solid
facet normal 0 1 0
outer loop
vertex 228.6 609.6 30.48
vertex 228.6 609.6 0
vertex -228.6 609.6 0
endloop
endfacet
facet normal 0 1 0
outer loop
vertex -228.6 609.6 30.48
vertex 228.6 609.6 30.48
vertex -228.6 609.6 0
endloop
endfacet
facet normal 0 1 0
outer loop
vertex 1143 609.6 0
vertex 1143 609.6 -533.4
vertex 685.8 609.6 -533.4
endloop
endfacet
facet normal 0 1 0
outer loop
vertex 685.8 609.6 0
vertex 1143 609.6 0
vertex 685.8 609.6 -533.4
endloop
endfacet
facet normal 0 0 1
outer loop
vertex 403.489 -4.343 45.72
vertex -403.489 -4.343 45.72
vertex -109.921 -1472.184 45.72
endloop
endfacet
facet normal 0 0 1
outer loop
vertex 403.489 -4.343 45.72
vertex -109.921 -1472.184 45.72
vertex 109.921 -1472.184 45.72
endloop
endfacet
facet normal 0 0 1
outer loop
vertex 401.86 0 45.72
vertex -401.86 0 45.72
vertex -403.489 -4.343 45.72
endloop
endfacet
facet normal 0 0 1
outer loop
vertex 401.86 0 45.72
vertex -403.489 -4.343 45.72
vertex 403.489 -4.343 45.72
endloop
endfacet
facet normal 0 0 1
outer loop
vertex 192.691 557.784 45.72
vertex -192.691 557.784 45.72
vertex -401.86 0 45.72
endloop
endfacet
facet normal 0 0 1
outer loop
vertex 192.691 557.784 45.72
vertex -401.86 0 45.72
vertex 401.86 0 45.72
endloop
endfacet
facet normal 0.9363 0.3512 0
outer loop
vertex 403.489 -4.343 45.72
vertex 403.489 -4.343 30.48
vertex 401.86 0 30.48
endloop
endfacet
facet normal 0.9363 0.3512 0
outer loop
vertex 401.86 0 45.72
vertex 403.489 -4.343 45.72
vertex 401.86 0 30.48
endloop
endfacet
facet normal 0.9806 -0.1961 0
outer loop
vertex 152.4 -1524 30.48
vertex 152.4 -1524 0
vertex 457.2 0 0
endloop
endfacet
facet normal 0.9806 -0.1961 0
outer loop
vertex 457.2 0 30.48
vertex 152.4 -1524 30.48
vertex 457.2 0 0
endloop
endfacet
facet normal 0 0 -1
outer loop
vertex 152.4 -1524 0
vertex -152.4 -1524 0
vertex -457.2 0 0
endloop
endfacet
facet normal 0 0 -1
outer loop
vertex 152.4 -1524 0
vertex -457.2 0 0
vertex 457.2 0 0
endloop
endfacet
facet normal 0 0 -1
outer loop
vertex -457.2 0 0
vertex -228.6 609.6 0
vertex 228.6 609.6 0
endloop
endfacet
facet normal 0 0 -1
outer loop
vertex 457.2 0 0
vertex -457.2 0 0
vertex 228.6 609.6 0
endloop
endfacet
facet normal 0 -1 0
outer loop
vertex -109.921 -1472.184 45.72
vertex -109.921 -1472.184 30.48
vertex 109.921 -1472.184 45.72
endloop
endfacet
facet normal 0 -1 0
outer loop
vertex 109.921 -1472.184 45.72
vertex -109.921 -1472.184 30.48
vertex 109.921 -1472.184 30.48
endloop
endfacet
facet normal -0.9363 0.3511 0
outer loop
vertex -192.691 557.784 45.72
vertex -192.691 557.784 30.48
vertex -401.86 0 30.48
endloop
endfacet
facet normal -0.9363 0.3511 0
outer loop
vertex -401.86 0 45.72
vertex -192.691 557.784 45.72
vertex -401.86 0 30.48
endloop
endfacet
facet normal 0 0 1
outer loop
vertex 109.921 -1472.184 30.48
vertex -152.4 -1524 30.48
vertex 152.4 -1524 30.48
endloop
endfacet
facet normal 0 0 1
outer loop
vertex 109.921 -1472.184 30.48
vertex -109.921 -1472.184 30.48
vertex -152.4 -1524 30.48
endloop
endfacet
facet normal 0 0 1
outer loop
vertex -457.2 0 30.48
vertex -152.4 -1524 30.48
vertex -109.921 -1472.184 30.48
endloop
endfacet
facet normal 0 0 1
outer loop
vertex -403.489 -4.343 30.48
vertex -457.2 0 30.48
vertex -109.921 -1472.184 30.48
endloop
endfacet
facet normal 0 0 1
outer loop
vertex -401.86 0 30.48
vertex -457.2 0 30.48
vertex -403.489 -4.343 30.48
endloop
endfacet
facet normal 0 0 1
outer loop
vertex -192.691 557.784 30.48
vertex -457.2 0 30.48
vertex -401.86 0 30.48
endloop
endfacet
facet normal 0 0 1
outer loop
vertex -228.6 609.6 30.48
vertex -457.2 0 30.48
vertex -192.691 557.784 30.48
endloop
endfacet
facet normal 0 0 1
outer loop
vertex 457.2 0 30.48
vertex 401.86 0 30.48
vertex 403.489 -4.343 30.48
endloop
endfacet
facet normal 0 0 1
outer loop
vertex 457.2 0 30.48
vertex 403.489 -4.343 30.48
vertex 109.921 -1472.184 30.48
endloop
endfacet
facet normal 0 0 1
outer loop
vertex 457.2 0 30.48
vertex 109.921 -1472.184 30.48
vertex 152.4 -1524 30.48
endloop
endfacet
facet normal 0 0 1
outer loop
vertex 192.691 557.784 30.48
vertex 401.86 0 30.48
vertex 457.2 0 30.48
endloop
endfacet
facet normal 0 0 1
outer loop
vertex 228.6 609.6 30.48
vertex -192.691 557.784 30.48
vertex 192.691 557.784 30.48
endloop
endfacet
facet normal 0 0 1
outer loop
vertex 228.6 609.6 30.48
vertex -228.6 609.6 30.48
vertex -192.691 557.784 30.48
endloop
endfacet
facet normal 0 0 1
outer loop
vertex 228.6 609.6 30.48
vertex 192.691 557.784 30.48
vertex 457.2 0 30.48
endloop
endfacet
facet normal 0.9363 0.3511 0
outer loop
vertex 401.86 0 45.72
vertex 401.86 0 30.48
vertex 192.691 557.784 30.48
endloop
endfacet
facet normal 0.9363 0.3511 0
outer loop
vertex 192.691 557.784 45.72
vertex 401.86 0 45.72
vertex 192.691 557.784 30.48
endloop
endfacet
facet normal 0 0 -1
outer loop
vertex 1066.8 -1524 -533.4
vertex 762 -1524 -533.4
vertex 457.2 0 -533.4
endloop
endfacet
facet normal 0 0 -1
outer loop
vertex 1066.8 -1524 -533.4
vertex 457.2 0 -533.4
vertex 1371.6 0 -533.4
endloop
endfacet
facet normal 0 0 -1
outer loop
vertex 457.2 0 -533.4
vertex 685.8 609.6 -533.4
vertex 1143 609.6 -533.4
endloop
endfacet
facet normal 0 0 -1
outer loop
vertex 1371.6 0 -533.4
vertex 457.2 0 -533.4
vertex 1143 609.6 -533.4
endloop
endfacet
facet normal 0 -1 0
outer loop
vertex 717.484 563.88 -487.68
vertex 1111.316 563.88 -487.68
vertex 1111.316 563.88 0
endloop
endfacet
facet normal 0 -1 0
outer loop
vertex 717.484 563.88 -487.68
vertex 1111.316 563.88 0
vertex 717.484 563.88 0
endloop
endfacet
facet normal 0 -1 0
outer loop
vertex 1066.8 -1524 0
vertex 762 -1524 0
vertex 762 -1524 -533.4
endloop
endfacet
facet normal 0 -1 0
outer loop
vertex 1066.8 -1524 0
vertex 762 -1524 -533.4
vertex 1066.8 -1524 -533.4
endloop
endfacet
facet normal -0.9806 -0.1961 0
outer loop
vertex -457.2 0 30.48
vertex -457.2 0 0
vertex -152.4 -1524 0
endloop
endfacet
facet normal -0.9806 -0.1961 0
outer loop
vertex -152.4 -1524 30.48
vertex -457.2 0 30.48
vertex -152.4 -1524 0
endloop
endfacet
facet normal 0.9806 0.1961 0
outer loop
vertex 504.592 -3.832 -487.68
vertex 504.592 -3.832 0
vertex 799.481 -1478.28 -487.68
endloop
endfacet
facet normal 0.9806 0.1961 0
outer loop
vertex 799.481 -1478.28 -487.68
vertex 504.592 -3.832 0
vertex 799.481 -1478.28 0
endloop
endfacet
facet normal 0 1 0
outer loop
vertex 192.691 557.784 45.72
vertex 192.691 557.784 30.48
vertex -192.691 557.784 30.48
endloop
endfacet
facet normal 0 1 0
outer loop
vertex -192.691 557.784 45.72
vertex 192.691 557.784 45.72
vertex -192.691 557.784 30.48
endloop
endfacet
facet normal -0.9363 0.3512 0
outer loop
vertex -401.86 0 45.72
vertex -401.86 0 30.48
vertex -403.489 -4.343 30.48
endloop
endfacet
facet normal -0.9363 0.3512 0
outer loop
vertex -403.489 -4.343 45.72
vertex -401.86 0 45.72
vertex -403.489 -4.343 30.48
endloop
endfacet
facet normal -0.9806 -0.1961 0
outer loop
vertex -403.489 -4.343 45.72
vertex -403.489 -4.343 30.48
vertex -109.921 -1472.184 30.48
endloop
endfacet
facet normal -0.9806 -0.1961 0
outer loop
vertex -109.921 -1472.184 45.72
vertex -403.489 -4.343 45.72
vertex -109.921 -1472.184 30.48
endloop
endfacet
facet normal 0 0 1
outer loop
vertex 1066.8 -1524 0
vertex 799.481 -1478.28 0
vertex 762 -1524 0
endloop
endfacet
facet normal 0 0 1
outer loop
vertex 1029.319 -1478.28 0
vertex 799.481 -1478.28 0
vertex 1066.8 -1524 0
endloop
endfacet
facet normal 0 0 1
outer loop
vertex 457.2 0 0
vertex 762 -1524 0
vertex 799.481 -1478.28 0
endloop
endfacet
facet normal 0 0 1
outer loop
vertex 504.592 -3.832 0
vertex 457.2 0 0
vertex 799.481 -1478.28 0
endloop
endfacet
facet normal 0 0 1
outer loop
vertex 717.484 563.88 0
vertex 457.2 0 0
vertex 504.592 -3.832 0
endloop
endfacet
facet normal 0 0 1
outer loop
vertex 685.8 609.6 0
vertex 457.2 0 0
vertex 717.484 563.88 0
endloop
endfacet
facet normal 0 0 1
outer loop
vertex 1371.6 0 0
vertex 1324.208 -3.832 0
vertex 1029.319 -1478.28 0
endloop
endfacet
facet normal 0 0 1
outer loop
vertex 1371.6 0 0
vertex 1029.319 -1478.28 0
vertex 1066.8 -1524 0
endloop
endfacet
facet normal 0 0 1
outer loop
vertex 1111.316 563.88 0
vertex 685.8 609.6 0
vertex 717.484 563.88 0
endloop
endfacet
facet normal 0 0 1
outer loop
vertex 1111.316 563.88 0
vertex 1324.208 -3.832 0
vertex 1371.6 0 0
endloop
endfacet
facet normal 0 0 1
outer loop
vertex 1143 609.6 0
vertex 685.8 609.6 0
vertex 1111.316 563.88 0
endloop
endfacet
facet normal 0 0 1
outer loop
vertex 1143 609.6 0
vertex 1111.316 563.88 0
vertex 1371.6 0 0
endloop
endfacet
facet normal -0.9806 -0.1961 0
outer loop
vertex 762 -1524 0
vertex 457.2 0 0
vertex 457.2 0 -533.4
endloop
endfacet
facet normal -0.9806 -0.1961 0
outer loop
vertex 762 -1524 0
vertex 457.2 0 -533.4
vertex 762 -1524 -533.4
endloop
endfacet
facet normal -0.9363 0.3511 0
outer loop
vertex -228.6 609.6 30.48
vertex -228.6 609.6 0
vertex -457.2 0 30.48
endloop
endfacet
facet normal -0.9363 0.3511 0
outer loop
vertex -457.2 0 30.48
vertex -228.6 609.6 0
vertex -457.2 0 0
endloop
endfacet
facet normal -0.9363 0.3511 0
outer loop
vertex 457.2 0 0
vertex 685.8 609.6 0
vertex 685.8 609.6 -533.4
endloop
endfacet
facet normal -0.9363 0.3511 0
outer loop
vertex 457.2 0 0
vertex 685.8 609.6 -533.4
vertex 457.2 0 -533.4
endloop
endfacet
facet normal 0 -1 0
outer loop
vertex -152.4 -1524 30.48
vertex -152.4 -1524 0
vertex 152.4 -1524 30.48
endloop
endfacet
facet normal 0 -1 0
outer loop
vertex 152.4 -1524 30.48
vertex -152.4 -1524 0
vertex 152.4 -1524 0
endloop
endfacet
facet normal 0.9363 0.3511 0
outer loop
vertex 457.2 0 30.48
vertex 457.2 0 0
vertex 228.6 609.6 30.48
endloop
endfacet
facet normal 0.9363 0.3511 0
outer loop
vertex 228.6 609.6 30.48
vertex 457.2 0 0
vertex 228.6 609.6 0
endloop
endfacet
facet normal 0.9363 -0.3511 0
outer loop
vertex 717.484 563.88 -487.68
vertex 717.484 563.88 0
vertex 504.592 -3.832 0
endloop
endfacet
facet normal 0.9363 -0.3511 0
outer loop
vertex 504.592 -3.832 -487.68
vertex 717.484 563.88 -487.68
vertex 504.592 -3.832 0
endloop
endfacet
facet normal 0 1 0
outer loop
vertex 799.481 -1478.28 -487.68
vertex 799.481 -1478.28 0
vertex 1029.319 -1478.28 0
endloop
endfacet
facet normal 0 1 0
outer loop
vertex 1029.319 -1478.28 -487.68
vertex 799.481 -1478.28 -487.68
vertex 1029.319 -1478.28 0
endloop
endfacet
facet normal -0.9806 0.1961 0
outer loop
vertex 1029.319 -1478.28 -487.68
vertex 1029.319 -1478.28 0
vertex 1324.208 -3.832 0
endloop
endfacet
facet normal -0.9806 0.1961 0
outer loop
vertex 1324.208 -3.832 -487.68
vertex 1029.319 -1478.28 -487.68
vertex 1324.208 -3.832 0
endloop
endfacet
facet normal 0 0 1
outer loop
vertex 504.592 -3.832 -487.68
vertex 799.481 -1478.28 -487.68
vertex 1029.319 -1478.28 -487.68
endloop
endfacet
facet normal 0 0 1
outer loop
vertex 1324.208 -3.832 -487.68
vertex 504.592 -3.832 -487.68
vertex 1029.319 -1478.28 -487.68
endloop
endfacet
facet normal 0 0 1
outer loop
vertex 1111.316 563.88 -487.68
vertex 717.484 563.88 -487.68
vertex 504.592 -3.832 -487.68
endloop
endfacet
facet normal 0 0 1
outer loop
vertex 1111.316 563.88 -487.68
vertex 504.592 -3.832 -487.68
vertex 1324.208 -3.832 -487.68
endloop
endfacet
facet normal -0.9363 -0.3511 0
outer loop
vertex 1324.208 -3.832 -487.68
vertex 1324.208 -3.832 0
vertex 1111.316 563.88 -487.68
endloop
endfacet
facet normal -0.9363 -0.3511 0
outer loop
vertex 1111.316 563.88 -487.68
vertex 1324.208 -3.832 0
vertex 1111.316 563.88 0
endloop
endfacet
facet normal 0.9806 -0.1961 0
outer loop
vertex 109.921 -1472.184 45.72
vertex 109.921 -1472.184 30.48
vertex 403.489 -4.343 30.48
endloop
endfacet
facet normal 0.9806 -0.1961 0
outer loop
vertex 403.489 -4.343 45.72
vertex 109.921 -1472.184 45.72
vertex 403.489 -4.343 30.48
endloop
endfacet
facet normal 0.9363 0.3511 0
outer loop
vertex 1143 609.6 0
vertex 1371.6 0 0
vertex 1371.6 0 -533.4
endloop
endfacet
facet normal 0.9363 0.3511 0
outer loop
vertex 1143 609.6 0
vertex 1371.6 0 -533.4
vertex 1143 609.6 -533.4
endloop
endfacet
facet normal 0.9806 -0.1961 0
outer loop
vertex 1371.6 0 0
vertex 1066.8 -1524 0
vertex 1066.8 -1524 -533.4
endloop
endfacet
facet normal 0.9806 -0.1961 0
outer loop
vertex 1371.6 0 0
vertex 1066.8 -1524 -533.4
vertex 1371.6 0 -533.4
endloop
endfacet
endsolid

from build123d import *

# Parameters (mm, degrees)
F1_DEPTH = 45.72
F2_DEPTH = 533.4
F3_T     = -45.72
F4_DEPTH = 30.48


with BuildPart() as f1:
    # F0 (on Top) → F1 (new body)
    with BuildSketch(Plane.XY):
        Polygon((-401.860498, 0), (0, 0), (0, 557.78401), (-192.691494, 557.78401), align=None)
        Polygon((0, 557.78401), (0, 0), (401.860498, 0), (192.691494, 557.78401), align=None)
        Polygon((401.860498, 0), (0, 0), (0, -1472.18401), (109.921049, -1472.18401), (403.489206, -4.343222), align=None)
        Polygon((0, -1472.18401), (0, 0), (-401.860498, 0), (-403.489206, -4.343222), (-109.921049, -1472.18401), align=None)
    extrude(amount=F1_DEPTH)



with BuildPart() as f2:
    # F0 (on Top) → F2 (new body)
    with BuildSketch(Plane.XY):
        Polygon((685.8, 609.6), (457.2, 0), (914.4, 0), (914.4, 609.6), align=None)
        Polygon((914.4, 609.6), (914.4, 0), (1371.6, 0), (1143, 609.6), align=None)
        Polygon((1371.6, 0), (914.4, 0), (914.4, -1524), (1066.8, -1524), align=None)
        Polygon((914.4, 0), (457.2, 0), (762, -1524), (914.4, -1524), align=None)
    extrude(amount=-F2_DEPTH)

    # F3
    f3_openings = [f2.faces().sort_by_distance(p)[0] for p in [
        (914.4, -353.848276, 0),
    ]]
    offset(amount=F3_T, openings=f3_openings)


with BuildPart() as f1_1:
    add(f1.part)

    add(f2.part)  # F4 merges F2
    # F0 (on Top) → F4 (join)
    with BuildSketch(Plane.XY):
        Polygon((-192.691494, 557.78401), (0, 557.78401), (0, 609.6), (-228.6, 609.6), (-457.2, 0), (-401.860498, 0), align=None)
        Polygon((0, -1524), (0, -1472.18401), (-109.921049, -1472.18401), (-403.489206, -4.343222), (-401.860498, 0), (-457.2, 0), (-152.4, -1524), align=None)
        Polygon((109.921049, -1472.18401), (0, -1472.18401), (0, -1524), (152.4, -1524), (457.2, 0), (401.860498, 0), (403.489206, -4.343222), align=None)
        Polygon((0, 609.6), (0, 557.78401), (192.691494, 557.78401), (401.860498, 0), (457.2, 0), (228.6, 609.6), align=None)
    extrude(amount=F4_DEPTH)


solid = f1_1.part
